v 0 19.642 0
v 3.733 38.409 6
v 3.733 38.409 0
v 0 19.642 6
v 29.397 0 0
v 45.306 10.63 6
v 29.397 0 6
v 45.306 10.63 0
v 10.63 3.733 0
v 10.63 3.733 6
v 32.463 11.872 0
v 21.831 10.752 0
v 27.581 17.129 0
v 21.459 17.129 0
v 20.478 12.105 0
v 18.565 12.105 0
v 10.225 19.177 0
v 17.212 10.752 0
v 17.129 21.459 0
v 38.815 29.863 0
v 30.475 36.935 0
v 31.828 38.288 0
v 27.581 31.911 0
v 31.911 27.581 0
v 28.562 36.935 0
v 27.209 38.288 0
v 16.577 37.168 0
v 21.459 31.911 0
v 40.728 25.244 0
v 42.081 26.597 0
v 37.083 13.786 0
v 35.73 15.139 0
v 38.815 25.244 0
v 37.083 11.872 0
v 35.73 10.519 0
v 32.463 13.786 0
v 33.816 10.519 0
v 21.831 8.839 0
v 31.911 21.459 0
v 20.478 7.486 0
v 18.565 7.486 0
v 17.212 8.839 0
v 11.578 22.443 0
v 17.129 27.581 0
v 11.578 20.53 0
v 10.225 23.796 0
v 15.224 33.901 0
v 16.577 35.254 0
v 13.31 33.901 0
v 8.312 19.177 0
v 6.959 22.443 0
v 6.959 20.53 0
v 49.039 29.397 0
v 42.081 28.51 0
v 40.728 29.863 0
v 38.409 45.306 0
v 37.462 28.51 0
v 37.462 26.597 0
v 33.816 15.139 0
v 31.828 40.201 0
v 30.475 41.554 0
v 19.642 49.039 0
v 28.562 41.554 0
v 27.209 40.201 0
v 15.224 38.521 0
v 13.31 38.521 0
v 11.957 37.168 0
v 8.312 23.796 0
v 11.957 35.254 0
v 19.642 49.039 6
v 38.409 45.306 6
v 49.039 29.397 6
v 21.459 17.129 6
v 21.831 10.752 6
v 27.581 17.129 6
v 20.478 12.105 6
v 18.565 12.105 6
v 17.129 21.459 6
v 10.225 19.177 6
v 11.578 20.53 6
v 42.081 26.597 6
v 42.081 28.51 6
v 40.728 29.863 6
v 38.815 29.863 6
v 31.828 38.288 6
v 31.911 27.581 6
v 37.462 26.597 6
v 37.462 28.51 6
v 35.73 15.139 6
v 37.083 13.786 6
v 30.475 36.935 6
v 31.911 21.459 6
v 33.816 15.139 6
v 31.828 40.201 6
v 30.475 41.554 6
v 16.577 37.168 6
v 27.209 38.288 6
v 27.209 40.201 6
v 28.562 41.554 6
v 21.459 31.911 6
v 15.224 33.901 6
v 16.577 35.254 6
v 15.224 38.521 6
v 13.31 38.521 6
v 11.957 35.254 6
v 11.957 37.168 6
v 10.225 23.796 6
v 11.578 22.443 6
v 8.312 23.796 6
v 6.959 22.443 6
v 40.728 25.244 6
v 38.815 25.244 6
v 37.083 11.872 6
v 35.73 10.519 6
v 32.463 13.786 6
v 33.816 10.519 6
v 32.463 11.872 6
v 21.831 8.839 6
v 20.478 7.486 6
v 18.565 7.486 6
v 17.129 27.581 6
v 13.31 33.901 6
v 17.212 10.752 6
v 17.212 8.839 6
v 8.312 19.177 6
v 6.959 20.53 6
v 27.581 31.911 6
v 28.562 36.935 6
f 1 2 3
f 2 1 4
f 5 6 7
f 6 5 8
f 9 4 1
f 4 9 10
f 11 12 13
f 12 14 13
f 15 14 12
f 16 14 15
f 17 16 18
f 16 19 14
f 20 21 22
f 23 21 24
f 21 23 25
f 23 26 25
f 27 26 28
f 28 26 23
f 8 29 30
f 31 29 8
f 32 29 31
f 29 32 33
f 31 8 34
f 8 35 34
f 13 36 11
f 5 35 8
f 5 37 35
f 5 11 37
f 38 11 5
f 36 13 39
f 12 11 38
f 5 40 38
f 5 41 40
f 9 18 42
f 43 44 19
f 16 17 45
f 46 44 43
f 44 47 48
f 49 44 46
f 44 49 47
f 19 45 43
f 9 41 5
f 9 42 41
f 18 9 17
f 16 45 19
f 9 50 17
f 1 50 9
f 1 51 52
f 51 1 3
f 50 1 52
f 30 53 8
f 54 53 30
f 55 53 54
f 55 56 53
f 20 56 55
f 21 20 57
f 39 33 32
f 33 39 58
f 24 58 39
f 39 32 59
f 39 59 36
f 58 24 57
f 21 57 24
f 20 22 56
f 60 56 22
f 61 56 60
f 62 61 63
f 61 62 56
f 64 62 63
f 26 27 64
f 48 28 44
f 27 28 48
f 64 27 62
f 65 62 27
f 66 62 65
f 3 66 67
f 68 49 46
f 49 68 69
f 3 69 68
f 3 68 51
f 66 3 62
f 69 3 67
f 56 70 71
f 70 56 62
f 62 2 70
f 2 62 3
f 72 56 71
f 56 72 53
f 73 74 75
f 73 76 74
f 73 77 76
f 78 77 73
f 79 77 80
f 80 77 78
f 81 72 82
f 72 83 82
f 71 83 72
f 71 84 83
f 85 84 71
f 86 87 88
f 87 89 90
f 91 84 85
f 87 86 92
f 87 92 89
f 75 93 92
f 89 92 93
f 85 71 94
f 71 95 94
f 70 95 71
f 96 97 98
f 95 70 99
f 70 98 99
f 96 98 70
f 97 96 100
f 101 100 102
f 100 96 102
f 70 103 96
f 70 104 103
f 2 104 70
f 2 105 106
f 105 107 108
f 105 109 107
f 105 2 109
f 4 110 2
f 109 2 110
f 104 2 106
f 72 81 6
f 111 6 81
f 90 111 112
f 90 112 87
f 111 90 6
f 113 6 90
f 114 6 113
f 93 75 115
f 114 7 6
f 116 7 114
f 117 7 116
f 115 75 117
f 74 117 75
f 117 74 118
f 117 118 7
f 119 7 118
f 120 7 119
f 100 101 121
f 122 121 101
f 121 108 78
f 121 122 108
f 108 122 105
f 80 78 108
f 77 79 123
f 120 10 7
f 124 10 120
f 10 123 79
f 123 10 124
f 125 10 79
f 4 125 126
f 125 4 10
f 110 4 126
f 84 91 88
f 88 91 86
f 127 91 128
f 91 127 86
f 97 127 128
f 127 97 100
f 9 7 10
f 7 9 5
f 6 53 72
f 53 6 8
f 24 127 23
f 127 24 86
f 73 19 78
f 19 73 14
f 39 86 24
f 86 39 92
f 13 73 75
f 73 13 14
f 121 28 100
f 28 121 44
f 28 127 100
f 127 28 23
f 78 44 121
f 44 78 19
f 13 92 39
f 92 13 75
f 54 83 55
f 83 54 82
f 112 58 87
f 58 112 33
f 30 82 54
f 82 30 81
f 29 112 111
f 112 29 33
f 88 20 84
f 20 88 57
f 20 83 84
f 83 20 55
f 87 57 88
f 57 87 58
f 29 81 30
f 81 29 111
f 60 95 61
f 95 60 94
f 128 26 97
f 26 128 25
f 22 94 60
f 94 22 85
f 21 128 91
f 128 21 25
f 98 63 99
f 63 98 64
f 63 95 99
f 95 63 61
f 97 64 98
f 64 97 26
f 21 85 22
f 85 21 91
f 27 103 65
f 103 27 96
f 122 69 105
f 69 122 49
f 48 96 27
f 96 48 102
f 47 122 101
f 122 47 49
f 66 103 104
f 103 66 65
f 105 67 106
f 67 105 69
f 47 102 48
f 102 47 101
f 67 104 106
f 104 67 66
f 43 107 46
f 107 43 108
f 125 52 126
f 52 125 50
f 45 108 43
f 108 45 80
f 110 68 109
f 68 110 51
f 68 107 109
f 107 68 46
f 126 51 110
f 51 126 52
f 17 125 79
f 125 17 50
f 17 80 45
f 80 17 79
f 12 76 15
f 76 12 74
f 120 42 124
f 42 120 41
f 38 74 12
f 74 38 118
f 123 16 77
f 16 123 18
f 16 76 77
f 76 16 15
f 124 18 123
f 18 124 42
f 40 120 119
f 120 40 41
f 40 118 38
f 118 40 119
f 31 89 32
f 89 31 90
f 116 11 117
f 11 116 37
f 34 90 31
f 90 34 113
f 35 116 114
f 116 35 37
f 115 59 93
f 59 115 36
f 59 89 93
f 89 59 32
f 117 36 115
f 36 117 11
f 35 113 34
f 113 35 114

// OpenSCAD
$fn = 32;

// ----------------------------------------------------------------------
// Polygon plate: 8-gon R25, 6 bolt windows
// ----------------------------------------------------------------------

// --- parameters (mm) ---
sides = 8;                // number of polygon sides
plate_r = 25;             // circumscribed radius of the polygon
bore_r = 8;               // centre bore radius
bolts = 6;                // number of bolt windows
ring_r = 15.55;           // bolt-circle radius
bolt_r = 2.5;             // bolt window radius
plate_t = 6;              // plate thickness, Z (extrusion height)
fit_tol = 0.05;           // declared fit tolerance (prompt contract)
free_tol = 0.2;           // declared free tolerance (prompt contract)

plate_d = 2 * plate_r;  // circumscribed diameter
bore_d = 2 * bore_r;  // centre bore diameter
bolt_d = 2 * bolt_r;  // bolt window diameter
ring_d = 2 * ring_r;  // bolt-circle diameter

profile = [[49.039, 29.397], [38.409, 45.306], [19.642, 49.039], [3.733, 38.409], [0, 19.642], [10.63, 3.733], [29.397, 0], [45.306, 10.63]];  // primary outline, 8 points, counter clockwise
void_1 = [[31.911, 27.581], [27.581, 31.911], [21.459, 31.911], [17.129, 27.581], [17.129, 21.459], [21.459, 17.129], [27.581, 17.129], [31.911, 21.459]];  // centre bore, 8 points
void_2 = [[42.081, 28.51], [40.728, 29.863], [38.815, 29.863], [37.462, 28.51], [37.462, 26.597], [38.815, 25.244], [40.728, 25.244], [42.081, 26.597]];  // bolt window 1, 8 points
void_3 = [[31.828, 40.201], [30.475, 41.554], [28.562, 41.554], [27.209, 40.201], [27.209, 38.288], [28.562, 36.935], [30.475, 36.935], [31.828, 38.288]];  // bolt window 2, 8 points
void_4 = [[16.577, 37.168], [15.224, 38.521], [13.31, 38.521], [11.957, 37.168], [11.957, 35.254], [13.31, 33.901], [15.224, 33.901], [16.577, 35.254]];  // bolt window 3, 8 points
void_5 = [[11.578, 22.443], [10.225, 23.796], [8.312, 23.796], [6.959, 22.443], [6.959, 20.53], [8.312, 19.177], [10.225, 19.177], [11.578, 20.53]];  // bolt window 4, 8 points
void_6 = [[21.831, 10.752], [20.478, 12.105], [18.565, 12.105], [17.212, 10.752], [17.212, 8.839], [18.565, 7.486], [20.478, 7.486], [21.831, 8.839]];  // bolt window 5, 8 points
void_7 = [[37.083, 13.786], [35.73, 15.139], [33.816, 15.139], [32.463, 13.786], [32.463, 11.872], [33.816, 10.519], [35.73, 10.519], [37.083, 11.872]];  // bolt window 6, 8 points

// --- the one profile operation ---
difference() {
  linear_extrude(height = plate_t) polygon(points = profile);
  translate([0, 0, -1])
    linear_extrude(height = plate_t + 2) polygon(points = void_1);
  translate([0, 0, -1])
    linear_extrude(height = plate_t + 2) polygon(points = void_2);
  translate([0, 0, -1])
    linear_extrude(height = plate_t + 2) polygon(points = void_3);
  translate([0, 0, -1])
    linear_extrude(height = plate_t + 2) polygon(points = void_4);
  translate([0, 0, -1])
    linear_extrude(height = plate_t + 2) polygon(points = void_5);
  translate([0, 0, -1])
    linear_extrude(height = plate_t + 2) polygon(points = void_6);
  translate([0, 0, -1])
    linear_extrude(height = plate_t + 2) polygon(points = void_7);
}
